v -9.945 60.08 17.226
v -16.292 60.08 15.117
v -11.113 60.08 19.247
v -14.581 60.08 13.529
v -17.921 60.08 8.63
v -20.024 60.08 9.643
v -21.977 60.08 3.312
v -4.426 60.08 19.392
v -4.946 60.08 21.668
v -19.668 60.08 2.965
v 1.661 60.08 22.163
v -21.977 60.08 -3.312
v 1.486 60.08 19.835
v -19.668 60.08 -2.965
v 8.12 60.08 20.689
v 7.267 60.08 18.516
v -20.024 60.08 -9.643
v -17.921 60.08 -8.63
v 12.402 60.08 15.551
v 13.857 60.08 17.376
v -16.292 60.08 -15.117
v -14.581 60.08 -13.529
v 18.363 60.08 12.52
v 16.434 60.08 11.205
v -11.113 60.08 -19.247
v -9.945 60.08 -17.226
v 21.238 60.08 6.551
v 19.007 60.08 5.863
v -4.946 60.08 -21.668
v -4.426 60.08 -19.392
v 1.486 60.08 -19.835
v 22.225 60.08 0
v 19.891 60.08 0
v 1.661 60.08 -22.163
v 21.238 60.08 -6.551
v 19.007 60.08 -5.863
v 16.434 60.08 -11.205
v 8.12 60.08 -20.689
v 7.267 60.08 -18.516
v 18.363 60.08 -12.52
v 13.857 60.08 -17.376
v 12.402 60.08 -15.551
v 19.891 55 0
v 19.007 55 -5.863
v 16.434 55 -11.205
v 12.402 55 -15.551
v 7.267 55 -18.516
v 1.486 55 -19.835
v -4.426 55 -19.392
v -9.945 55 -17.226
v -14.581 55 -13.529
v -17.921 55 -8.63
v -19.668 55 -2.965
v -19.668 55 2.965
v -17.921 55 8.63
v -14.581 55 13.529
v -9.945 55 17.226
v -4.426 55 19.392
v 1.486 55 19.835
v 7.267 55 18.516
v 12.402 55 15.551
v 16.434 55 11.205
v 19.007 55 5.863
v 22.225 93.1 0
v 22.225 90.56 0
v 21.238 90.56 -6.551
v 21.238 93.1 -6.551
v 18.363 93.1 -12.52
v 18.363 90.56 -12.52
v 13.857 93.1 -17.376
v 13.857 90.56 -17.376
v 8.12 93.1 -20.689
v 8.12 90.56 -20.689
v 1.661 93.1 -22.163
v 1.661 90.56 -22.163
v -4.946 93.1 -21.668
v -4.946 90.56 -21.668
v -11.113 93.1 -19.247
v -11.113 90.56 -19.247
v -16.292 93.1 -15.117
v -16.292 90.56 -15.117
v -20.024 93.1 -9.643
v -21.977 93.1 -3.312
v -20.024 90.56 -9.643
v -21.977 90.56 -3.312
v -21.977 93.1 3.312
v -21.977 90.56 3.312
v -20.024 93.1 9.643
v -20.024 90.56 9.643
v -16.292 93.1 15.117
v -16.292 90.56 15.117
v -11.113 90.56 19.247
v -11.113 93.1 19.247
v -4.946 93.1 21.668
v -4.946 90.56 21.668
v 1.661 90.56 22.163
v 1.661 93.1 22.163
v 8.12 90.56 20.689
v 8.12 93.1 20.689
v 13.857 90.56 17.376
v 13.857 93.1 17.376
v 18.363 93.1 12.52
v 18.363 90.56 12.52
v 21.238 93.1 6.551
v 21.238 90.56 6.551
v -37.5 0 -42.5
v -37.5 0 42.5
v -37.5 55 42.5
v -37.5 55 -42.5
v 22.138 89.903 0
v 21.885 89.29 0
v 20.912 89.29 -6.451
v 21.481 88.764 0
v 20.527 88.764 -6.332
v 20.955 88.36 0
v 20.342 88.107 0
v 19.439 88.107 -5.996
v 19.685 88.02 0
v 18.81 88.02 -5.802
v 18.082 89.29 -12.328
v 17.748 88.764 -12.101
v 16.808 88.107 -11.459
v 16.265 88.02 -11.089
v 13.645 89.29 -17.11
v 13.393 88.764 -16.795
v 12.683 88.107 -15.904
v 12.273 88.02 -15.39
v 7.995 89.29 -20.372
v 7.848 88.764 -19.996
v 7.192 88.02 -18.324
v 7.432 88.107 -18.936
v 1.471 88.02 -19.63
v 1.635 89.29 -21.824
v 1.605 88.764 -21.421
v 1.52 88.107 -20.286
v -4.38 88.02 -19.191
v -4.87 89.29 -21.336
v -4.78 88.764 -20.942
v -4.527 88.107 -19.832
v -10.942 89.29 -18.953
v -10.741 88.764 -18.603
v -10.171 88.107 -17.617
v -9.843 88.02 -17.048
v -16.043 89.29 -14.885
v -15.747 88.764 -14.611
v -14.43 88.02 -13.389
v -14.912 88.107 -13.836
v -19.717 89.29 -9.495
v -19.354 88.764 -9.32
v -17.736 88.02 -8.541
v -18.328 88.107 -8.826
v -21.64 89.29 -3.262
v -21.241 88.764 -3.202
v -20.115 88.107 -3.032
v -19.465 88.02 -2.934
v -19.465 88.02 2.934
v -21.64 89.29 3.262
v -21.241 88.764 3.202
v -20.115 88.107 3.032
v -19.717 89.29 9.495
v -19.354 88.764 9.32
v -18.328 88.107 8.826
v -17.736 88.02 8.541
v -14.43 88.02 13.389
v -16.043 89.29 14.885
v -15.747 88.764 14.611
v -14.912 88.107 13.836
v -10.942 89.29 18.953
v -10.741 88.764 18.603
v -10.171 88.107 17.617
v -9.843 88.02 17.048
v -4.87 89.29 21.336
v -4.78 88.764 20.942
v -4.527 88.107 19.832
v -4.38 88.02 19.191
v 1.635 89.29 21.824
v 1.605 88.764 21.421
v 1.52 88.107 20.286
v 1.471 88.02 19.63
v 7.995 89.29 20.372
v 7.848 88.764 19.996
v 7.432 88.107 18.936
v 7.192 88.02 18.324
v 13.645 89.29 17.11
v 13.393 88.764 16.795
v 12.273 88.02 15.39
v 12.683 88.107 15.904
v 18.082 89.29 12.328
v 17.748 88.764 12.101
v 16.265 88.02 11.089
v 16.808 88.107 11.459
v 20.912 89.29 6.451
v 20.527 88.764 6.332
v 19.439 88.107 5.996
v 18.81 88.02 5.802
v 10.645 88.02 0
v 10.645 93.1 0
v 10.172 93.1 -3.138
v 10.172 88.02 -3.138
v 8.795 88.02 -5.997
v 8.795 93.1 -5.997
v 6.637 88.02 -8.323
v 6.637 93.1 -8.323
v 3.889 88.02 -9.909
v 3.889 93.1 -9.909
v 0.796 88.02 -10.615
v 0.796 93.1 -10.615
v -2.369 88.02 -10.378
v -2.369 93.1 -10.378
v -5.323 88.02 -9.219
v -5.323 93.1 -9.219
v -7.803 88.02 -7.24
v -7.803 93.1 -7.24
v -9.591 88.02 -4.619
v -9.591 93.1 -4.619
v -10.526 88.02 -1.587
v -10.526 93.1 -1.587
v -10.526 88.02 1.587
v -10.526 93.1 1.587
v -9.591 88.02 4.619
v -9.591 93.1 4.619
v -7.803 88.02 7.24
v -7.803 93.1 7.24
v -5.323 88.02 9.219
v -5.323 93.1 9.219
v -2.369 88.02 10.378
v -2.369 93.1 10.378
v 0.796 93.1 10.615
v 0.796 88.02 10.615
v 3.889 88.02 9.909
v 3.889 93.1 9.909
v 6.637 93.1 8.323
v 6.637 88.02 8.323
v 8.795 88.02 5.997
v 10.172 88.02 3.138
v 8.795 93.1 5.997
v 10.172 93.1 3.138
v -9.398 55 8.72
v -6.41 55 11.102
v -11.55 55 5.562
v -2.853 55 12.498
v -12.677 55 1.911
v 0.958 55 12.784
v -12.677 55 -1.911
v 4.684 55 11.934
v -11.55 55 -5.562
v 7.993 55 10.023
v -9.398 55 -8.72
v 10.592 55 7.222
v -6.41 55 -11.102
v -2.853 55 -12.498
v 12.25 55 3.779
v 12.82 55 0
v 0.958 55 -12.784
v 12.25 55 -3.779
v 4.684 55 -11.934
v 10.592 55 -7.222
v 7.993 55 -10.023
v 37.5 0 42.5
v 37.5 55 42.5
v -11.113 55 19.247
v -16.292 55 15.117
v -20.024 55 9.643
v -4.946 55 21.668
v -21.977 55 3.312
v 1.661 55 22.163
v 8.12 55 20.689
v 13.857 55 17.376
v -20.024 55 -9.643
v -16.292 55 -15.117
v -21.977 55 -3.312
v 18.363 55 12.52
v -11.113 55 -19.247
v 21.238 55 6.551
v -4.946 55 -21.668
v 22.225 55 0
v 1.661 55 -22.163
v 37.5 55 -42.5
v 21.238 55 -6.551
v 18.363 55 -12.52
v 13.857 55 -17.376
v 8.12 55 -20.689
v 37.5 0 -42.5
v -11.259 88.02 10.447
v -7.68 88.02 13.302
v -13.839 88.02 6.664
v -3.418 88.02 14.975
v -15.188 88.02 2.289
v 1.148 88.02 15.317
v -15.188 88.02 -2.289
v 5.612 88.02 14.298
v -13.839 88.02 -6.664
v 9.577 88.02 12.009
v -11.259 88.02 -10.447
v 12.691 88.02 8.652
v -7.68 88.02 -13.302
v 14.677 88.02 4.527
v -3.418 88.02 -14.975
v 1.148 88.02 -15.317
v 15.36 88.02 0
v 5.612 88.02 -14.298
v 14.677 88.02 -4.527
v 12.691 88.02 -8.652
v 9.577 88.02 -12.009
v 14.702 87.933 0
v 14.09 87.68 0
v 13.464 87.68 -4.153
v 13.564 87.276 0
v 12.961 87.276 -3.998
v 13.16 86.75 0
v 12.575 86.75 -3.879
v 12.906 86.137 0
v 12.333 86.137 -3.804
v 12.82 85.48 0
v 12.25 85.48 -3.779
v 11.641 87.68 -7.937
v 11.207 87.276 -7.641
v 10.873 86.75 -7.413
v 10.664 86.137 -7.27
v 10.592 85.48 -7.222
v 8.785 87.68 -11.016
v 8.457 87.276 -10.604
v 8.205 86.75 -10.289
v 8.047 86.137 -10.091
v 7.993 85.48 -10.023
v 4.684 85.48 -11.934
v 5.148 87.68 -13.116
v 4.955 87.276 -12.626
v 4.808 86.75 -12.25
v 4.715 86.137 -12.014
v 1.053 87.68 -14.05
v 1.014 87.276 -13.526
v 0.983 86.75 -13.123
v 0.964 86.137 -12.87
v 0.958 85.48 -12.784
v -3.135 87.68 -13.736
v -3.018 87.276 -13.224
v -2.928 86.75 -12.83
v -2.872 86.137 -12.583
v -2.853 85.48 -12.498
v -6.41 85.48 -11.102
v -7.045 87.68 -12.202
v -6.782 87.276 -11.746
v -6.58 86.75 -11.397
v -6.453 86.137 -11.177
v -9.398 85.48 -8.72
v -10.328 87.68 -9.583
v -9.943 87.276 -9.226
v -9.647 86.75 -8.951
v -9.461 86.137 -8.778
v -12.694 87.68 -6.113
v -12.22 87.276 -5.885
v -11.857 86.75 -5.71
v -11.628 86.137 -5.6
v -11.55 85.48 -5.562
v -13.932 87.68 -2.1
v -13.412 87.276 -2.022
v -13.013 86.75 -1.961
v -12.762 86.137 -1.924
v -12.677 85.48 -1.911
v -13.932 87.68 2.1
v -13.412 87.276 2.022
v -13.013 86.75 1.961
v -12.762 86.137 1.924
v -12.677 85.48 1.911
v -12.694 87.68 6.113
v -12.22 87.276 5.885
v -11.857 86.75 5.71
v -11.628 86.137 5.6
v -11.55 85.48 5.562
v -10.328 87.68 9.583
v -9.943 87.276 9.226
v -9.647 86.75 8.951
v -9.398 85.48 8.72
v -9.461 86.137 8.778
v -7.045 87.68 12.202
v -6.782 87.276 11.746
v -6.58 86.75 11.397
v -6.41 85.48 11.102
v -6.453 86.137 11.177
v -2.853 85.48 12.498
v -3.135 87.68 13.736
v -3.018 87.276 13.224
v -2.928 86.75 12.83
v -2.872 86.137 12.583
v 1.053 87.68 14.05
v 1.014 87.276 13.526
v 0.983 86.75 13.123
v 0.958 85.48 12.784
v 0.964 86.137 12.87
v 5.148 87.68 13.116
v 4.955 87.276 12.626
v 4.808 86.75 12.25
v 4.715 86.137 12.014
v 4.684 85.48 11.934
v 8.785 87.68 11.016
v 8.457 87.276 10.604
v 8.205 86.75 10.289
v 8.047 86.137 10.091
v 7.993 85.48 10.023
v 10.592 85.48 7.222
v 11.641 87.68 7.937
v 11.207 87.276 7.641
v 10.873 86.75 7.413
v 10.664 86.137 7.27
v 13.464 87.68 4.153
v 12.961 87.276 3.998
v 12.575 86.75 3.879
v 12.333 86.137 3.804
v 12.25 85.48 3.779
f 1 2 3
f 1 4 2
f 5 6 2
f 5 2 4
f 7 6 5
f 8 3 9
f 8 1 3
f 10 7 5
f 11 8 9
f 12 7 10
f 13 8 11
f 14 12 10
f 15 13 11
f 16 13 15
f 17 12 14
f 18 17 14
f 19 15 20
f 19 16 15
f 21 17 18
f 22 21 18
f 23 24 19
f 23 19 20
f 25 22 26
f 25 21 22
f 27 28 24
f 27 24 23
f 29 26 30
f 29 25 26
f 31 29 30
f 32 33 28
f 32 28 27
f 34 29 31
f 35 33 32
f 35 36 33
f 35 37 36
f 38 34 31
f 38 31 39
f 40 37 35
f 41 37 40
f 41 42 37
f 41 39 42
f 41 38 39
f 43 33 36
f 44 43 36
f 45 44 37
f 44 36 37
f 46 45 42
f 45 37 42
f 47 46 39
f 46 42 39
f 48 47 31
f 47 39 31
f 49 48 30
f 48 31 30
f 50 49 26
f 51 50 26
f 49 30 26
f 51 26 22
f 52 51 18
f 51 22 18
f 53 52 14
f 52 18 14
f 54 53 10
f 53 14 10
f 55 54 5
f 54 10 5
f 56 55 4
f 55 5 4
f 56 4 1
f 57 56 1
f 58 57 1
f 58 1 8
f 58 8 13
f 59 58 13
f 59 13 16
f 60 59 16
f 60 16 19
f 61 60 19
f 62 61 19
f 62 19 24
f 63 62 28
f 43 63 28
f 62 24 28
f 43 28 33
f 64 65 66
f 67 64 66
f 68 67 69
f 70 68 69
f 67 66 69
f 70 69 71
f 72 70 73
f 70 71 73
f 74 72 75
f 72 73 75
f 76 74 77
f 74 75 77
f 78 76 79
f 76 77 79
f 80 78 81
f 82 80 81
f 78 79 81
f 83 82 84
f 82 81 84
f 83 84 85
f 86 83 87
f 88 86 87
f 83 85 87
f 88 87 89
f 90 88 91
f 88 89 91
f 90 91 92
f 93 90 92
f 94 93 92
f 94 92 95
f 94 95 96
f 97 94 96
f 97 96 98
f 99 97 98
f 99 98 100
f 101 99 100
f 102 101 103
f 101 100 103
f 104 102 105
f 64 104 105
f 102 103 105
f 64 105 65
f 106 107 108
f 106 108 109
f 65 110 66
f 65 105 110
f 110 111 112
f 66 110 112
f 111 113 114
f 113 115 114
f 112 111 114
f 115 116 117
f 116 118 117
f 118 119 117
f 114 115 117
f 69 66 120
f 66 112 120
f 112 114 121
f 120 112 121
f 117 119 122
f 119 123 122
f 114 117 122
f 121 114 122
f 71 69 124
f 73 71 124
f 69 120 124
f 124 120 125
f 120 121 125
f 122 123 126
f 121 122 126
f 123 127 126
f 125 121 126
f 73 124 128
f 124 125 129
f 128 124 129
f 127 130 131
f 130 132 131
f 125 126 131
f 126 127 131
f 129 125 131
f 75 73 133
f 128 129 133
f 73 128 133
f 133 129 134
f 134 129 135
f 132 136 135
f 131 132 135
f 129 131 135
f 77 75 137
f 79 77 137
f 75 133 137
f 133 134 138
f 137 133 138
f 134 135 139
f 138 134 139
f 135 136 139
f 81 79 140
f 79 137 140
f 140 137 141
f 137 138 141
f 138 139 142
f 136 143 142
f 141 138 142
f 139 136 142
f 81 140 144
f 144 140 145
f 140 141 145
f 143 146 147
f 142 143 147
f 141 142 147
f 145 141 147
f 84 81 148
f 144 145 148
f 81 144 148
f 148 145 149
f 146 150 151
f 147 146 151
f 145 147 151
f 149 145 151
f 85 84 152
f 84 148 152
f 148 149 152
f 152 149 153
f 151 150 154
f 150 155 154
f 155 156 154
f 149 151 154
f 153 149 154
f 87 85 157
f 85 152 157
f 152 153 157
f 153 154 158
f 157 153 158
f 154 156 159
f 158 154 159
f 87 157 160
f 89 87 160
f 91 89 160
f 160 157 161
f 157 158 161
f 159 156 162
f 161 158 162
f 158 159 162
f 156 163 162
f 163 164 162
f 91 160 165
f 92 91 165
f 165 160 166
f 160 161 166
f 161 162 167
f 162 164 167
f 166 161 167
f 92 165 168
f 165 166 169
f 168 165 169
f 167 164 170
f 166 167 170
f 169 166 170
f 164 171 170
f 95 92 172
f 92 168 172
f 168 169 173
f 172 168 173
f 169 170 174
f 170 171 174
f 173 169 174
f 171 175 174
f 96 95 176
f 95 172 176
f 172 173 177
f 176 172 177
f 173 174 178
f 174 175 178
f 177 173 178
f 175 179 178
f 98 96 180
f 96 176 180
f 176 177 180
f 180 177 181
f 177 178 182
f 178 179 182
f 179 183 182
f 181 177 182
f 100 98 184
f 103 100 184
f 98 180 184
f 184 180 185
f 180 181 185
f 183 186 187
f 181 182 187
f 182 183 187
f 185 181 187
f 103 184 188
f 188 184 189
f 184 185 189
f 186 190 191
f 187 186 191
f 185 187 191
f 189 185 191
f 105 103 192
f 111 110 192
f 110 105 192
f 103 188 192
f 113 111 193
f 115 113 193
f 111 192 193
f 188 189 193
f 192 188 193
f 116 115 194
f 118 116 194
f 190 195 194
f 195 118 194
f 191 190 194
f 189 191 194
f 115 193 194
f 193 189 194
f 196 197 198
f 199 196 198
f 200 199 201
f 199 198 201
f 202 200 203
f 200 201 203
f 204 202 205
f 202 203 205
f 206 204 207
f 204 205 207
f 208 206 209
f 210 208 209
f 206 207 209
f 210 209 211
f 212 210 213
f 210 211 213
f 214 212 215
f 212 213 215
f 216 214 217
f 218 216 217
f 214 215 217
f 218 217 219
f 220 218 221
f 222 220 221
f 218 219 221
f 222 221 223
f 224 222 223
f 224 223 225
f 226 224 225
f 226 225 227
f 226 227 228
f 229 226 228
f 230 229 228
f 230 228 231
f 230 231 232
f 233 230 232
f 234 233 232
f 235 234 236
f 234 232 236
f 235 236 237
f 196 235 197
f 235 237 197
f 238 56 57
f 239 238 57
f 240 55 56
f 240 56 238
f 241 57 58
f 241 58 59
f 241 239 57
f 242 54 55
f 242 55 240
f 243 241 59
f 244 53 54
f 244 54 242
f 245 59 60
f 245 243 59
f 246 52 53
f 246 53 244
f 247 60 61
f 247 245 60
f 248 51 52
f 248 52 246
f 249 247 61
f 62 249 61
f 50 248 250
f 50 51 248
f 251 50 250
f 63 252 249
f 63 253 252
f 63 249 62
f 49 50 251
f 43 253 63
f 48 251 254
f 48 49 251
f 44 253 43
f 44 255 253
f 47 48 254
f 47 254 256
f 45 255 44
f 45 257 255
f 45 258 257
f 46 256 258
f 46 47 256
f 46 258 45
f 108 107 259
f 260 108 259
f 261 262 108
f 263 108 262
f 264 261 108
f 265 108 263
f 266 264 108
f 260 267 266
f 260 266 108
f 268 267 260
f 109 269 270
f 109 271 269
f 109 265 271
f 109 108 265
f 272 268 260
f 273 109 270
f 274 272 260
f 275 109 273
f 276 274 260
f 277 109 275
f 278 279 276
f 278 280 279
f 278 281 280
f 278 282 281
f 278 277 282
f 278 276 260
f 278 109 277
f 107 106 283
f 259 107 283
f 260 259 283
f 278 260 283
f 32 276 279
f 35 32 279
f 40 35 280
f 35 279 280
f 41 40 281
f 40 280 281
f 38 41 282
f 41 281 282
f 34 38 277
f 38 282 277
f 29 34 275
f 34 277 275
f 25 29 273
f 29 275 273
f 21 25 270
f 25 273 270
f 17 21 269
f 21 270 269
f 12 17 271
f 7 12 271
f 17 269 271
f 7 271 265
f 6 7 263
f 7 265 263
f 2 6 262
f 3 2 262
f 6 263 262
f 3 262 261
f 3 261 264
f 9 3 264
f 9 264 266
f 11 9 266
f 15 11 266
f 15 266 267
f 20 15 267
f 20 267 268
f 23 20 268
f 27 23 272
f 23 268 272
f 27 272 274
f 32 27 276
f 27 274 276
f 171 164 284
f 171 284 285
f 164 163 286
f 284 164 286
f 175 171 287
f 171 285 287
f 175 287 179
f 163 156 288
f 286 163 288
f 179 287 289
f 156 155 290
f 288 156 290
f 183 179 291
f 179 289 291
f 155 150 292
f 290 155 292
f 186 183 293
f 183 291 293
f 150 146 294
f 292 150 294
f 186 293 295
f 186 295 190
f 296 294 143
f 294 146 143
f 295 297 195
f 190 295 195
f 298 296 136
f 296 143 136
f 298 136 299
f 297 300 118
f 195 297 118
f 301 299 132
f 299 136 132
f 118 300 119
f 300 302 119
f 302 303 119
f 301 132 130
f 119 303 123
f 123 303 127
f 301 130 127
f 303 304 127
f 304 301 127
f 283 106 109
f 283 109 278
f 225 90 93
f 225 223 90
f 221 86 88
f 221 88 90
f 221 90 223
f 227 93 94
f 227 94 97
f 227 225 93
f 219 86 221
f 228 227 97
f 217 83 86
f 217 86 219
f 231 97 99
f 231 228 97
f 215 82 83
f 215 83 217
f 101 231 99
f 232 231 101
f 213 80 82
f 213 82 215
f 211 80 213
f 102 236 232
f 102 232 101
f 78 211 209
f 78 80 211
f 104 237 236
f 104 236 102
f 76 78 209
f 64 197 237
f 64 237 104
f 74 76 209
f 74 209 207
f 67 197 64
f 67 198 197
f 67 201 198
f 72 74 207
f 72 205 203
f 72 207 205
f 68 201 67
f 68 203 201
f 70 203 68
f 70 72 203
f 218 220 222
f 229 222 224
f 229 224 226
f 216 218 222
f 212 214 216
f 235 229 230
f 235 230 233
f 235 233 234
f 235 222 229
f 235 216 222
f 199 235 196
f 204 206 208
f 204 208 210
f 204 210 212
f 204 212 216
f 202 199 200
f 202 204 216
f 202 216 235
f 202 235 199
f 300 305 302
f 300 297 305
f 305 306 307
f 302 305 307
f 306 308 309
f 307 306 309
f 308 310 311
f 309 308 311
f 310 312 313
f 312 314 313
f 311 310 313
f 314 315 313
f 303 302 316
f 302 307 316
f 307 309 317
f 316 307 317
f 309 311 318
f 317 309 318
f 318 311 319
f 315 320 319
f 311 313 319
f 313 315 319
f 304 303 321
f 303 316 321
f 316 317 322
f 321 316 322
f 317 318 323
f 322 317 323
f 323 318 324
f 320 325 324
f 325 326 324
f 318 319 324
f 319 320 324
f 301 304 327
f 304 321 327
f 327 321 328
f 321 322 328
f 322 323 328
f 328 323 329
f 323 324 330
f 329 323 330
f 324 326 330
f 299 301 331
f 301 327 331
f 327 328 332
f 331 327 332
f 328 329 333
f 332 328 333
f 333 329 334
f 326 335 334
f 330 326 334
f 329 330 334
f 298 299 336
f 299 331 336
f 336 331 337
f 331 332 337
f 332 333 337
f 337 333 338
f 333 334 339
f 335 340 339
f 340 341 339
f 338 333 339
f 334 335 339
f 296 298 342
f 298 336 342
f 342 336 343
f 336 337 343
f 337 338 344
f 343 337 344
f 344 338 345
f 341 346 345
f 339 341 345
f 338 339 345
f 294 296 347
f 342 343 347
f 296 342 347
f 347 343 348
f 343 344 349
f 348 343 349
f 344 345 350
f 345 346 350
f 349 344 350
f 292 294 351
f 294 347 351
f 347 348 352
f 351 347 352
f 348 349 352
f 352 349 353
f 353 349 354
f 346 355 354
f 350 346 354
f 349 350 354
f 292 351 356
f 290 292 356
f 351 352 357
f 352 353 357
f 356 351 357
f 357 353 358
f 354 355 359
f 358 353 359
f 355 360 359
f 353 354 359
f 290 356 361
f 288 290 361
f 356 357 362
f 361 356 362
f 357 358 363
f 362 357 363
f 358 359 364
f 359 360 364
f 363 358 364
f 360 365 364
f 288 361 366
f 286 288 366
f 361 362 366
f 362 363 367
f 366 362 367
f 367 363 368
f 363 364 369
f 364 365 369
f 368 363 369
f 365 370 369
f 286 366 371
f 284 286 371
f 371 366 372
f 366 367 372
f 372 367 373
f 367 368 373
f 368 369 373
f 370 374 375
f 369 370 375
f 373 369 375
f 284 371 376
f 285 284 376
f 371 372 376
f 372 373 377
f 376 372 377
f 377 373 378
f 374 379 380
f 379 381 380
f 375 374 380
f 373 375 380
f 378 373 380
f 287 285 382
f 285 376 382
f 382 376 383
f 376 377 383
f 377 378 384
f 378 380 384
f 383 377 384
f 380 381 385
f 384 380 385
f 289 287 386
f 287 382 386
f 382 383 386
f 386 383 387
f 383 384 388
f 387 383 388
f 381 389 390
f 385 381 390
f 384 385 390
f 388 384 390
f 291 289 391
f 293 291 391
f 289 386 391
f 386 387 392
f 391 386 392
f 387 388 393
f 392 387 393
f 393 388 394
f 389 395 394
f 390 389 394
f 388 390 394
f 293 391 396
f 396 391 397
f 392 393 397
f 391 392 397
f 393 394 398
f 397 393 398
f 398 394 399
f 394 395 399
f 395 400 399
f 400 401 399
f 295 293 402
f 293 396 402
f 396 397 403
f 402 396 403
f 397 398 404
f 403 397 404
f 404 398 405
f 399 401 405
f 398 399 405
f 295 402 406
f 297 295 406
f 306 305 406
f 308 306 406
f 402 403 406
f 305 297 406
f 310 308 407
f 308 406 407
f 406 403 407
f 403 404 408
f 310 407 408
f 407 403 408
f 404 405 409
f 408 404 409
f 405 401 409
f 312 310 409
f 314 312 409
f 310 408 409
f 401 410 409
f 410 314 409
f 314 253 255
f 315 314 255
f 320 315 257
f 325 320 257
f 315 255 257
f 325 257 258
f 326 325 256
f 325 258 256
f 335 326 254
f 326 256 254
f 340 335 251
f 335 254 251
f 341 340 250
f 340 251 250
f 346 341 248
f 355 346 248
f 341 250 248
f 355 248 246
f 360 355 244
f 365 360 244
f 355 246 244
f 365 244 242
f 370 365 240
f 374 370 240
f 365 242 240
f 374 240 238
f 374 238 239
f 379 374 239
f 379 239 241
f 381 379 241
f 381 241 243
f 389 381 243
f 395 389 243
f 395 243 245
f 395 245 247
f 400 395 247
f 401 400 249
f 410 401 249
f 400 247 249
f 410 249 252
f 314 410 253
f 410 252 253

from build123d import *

# Parameters (mm, degrees)
SKETCH1_W           = 75
SKETCH1_H           = 85
BOSS_EXTRUDE1_DEPTH = 55
SKETCH2_R           = 22.225
BOSS_EXTRUDE2_DEPTH = 5.08
SKETCH3_2_R         = 19.890557265
CUT_EXTRUDE1_DEPTH  = 5.08
SKETCH4_R           = 12.819708226
BOSS_EXTRUDE4_DEPTH = 33.02
SKETCH5_R           = 22.225
BOSS_EXTRUDE5_DEPTH = 5.08
FILLET1_R           = 2.54
SKETCH6_R           = 10.645057699
CUT_EXTRUDE2_DEPTH  = 5.08


with BuildPart() as part:
    # Sketch1 → Boss-Extrude1 (new body)
    with BuildSketch(Plane(origin=(0, 0, 0), x_dir=(1, 0, 0), z_dir=(0, 1, 0))):
        Rectangle(SKETCH1_W, SKETCH1_H)
    extrude(amount=BOSS_EXTRUDE1_DEPTH)

    # Sketch2 → Boss-Extrude2 (add)
    with BuildSketch(Plane(origin=(0, 55, 0), x_dir=(1, 0, 0), z_dir=(0, 1, 0))):
        Circle(SKETCH2_R)
    extrude(amount=BOSS_EXTRUDE2_DEPTH)

    # Sketch3<2> → Cut-Extrude1 (cut)
    with BuildSketch(Plane(origin=(0, 60.08, 0), x_dir=(1, 0, 0), z_dir=(0, 1, 0))):
        Circle(SKETCH3_2_R)
    extrude(amount=-CUT_EXTRUDE1_DEPTH, mode=Mode.SUBTRACT)

    # Sketch4 → Boss-Extrude4 (add)
    with BuildSketch(Plane(origin=(0, 55, 0), x_dir=(1, 0, 0), z_dir=(0, 1, 0))):
        Circle(SKETCH4_R)
    extrude(amount=BOSS_EXTRUDE4_DEPTH)

    # Sketch5 → Boss-Extrude5 (add)
    with BuildSketch(Plane(origin=(0, 88.02, 0), x_dir=(1, 0, 0), z_dir=(0, 1, 0))):
        Circle(SKETCH5_R)
    extrude(amount=BOSS_EXTRUDE5_DEPTH)

    # Fillet1
    fillet1_edges = [part.edges().sort_by_distance(p)[0] for p in [
        (-12.819708226, 88.02, 0),
        (-22.225, 88.02, 0),
    ]]
    fillet(fillet1_edges, radius=FILLET1_R)

    # Sketch6 → Cut-Extrude2 (cut)
    with BuildSketch(Plane(origin=(0, 93.1, 0), x_dir=(1, 0, 0), z_dir=(0, 1, 0))):
        Circle(SKETCH6_R)
    extrude(amount=-CUT_EXTRUDE2_DEPTH, mode=Mode.SUBTRACT)


solid = part.part
